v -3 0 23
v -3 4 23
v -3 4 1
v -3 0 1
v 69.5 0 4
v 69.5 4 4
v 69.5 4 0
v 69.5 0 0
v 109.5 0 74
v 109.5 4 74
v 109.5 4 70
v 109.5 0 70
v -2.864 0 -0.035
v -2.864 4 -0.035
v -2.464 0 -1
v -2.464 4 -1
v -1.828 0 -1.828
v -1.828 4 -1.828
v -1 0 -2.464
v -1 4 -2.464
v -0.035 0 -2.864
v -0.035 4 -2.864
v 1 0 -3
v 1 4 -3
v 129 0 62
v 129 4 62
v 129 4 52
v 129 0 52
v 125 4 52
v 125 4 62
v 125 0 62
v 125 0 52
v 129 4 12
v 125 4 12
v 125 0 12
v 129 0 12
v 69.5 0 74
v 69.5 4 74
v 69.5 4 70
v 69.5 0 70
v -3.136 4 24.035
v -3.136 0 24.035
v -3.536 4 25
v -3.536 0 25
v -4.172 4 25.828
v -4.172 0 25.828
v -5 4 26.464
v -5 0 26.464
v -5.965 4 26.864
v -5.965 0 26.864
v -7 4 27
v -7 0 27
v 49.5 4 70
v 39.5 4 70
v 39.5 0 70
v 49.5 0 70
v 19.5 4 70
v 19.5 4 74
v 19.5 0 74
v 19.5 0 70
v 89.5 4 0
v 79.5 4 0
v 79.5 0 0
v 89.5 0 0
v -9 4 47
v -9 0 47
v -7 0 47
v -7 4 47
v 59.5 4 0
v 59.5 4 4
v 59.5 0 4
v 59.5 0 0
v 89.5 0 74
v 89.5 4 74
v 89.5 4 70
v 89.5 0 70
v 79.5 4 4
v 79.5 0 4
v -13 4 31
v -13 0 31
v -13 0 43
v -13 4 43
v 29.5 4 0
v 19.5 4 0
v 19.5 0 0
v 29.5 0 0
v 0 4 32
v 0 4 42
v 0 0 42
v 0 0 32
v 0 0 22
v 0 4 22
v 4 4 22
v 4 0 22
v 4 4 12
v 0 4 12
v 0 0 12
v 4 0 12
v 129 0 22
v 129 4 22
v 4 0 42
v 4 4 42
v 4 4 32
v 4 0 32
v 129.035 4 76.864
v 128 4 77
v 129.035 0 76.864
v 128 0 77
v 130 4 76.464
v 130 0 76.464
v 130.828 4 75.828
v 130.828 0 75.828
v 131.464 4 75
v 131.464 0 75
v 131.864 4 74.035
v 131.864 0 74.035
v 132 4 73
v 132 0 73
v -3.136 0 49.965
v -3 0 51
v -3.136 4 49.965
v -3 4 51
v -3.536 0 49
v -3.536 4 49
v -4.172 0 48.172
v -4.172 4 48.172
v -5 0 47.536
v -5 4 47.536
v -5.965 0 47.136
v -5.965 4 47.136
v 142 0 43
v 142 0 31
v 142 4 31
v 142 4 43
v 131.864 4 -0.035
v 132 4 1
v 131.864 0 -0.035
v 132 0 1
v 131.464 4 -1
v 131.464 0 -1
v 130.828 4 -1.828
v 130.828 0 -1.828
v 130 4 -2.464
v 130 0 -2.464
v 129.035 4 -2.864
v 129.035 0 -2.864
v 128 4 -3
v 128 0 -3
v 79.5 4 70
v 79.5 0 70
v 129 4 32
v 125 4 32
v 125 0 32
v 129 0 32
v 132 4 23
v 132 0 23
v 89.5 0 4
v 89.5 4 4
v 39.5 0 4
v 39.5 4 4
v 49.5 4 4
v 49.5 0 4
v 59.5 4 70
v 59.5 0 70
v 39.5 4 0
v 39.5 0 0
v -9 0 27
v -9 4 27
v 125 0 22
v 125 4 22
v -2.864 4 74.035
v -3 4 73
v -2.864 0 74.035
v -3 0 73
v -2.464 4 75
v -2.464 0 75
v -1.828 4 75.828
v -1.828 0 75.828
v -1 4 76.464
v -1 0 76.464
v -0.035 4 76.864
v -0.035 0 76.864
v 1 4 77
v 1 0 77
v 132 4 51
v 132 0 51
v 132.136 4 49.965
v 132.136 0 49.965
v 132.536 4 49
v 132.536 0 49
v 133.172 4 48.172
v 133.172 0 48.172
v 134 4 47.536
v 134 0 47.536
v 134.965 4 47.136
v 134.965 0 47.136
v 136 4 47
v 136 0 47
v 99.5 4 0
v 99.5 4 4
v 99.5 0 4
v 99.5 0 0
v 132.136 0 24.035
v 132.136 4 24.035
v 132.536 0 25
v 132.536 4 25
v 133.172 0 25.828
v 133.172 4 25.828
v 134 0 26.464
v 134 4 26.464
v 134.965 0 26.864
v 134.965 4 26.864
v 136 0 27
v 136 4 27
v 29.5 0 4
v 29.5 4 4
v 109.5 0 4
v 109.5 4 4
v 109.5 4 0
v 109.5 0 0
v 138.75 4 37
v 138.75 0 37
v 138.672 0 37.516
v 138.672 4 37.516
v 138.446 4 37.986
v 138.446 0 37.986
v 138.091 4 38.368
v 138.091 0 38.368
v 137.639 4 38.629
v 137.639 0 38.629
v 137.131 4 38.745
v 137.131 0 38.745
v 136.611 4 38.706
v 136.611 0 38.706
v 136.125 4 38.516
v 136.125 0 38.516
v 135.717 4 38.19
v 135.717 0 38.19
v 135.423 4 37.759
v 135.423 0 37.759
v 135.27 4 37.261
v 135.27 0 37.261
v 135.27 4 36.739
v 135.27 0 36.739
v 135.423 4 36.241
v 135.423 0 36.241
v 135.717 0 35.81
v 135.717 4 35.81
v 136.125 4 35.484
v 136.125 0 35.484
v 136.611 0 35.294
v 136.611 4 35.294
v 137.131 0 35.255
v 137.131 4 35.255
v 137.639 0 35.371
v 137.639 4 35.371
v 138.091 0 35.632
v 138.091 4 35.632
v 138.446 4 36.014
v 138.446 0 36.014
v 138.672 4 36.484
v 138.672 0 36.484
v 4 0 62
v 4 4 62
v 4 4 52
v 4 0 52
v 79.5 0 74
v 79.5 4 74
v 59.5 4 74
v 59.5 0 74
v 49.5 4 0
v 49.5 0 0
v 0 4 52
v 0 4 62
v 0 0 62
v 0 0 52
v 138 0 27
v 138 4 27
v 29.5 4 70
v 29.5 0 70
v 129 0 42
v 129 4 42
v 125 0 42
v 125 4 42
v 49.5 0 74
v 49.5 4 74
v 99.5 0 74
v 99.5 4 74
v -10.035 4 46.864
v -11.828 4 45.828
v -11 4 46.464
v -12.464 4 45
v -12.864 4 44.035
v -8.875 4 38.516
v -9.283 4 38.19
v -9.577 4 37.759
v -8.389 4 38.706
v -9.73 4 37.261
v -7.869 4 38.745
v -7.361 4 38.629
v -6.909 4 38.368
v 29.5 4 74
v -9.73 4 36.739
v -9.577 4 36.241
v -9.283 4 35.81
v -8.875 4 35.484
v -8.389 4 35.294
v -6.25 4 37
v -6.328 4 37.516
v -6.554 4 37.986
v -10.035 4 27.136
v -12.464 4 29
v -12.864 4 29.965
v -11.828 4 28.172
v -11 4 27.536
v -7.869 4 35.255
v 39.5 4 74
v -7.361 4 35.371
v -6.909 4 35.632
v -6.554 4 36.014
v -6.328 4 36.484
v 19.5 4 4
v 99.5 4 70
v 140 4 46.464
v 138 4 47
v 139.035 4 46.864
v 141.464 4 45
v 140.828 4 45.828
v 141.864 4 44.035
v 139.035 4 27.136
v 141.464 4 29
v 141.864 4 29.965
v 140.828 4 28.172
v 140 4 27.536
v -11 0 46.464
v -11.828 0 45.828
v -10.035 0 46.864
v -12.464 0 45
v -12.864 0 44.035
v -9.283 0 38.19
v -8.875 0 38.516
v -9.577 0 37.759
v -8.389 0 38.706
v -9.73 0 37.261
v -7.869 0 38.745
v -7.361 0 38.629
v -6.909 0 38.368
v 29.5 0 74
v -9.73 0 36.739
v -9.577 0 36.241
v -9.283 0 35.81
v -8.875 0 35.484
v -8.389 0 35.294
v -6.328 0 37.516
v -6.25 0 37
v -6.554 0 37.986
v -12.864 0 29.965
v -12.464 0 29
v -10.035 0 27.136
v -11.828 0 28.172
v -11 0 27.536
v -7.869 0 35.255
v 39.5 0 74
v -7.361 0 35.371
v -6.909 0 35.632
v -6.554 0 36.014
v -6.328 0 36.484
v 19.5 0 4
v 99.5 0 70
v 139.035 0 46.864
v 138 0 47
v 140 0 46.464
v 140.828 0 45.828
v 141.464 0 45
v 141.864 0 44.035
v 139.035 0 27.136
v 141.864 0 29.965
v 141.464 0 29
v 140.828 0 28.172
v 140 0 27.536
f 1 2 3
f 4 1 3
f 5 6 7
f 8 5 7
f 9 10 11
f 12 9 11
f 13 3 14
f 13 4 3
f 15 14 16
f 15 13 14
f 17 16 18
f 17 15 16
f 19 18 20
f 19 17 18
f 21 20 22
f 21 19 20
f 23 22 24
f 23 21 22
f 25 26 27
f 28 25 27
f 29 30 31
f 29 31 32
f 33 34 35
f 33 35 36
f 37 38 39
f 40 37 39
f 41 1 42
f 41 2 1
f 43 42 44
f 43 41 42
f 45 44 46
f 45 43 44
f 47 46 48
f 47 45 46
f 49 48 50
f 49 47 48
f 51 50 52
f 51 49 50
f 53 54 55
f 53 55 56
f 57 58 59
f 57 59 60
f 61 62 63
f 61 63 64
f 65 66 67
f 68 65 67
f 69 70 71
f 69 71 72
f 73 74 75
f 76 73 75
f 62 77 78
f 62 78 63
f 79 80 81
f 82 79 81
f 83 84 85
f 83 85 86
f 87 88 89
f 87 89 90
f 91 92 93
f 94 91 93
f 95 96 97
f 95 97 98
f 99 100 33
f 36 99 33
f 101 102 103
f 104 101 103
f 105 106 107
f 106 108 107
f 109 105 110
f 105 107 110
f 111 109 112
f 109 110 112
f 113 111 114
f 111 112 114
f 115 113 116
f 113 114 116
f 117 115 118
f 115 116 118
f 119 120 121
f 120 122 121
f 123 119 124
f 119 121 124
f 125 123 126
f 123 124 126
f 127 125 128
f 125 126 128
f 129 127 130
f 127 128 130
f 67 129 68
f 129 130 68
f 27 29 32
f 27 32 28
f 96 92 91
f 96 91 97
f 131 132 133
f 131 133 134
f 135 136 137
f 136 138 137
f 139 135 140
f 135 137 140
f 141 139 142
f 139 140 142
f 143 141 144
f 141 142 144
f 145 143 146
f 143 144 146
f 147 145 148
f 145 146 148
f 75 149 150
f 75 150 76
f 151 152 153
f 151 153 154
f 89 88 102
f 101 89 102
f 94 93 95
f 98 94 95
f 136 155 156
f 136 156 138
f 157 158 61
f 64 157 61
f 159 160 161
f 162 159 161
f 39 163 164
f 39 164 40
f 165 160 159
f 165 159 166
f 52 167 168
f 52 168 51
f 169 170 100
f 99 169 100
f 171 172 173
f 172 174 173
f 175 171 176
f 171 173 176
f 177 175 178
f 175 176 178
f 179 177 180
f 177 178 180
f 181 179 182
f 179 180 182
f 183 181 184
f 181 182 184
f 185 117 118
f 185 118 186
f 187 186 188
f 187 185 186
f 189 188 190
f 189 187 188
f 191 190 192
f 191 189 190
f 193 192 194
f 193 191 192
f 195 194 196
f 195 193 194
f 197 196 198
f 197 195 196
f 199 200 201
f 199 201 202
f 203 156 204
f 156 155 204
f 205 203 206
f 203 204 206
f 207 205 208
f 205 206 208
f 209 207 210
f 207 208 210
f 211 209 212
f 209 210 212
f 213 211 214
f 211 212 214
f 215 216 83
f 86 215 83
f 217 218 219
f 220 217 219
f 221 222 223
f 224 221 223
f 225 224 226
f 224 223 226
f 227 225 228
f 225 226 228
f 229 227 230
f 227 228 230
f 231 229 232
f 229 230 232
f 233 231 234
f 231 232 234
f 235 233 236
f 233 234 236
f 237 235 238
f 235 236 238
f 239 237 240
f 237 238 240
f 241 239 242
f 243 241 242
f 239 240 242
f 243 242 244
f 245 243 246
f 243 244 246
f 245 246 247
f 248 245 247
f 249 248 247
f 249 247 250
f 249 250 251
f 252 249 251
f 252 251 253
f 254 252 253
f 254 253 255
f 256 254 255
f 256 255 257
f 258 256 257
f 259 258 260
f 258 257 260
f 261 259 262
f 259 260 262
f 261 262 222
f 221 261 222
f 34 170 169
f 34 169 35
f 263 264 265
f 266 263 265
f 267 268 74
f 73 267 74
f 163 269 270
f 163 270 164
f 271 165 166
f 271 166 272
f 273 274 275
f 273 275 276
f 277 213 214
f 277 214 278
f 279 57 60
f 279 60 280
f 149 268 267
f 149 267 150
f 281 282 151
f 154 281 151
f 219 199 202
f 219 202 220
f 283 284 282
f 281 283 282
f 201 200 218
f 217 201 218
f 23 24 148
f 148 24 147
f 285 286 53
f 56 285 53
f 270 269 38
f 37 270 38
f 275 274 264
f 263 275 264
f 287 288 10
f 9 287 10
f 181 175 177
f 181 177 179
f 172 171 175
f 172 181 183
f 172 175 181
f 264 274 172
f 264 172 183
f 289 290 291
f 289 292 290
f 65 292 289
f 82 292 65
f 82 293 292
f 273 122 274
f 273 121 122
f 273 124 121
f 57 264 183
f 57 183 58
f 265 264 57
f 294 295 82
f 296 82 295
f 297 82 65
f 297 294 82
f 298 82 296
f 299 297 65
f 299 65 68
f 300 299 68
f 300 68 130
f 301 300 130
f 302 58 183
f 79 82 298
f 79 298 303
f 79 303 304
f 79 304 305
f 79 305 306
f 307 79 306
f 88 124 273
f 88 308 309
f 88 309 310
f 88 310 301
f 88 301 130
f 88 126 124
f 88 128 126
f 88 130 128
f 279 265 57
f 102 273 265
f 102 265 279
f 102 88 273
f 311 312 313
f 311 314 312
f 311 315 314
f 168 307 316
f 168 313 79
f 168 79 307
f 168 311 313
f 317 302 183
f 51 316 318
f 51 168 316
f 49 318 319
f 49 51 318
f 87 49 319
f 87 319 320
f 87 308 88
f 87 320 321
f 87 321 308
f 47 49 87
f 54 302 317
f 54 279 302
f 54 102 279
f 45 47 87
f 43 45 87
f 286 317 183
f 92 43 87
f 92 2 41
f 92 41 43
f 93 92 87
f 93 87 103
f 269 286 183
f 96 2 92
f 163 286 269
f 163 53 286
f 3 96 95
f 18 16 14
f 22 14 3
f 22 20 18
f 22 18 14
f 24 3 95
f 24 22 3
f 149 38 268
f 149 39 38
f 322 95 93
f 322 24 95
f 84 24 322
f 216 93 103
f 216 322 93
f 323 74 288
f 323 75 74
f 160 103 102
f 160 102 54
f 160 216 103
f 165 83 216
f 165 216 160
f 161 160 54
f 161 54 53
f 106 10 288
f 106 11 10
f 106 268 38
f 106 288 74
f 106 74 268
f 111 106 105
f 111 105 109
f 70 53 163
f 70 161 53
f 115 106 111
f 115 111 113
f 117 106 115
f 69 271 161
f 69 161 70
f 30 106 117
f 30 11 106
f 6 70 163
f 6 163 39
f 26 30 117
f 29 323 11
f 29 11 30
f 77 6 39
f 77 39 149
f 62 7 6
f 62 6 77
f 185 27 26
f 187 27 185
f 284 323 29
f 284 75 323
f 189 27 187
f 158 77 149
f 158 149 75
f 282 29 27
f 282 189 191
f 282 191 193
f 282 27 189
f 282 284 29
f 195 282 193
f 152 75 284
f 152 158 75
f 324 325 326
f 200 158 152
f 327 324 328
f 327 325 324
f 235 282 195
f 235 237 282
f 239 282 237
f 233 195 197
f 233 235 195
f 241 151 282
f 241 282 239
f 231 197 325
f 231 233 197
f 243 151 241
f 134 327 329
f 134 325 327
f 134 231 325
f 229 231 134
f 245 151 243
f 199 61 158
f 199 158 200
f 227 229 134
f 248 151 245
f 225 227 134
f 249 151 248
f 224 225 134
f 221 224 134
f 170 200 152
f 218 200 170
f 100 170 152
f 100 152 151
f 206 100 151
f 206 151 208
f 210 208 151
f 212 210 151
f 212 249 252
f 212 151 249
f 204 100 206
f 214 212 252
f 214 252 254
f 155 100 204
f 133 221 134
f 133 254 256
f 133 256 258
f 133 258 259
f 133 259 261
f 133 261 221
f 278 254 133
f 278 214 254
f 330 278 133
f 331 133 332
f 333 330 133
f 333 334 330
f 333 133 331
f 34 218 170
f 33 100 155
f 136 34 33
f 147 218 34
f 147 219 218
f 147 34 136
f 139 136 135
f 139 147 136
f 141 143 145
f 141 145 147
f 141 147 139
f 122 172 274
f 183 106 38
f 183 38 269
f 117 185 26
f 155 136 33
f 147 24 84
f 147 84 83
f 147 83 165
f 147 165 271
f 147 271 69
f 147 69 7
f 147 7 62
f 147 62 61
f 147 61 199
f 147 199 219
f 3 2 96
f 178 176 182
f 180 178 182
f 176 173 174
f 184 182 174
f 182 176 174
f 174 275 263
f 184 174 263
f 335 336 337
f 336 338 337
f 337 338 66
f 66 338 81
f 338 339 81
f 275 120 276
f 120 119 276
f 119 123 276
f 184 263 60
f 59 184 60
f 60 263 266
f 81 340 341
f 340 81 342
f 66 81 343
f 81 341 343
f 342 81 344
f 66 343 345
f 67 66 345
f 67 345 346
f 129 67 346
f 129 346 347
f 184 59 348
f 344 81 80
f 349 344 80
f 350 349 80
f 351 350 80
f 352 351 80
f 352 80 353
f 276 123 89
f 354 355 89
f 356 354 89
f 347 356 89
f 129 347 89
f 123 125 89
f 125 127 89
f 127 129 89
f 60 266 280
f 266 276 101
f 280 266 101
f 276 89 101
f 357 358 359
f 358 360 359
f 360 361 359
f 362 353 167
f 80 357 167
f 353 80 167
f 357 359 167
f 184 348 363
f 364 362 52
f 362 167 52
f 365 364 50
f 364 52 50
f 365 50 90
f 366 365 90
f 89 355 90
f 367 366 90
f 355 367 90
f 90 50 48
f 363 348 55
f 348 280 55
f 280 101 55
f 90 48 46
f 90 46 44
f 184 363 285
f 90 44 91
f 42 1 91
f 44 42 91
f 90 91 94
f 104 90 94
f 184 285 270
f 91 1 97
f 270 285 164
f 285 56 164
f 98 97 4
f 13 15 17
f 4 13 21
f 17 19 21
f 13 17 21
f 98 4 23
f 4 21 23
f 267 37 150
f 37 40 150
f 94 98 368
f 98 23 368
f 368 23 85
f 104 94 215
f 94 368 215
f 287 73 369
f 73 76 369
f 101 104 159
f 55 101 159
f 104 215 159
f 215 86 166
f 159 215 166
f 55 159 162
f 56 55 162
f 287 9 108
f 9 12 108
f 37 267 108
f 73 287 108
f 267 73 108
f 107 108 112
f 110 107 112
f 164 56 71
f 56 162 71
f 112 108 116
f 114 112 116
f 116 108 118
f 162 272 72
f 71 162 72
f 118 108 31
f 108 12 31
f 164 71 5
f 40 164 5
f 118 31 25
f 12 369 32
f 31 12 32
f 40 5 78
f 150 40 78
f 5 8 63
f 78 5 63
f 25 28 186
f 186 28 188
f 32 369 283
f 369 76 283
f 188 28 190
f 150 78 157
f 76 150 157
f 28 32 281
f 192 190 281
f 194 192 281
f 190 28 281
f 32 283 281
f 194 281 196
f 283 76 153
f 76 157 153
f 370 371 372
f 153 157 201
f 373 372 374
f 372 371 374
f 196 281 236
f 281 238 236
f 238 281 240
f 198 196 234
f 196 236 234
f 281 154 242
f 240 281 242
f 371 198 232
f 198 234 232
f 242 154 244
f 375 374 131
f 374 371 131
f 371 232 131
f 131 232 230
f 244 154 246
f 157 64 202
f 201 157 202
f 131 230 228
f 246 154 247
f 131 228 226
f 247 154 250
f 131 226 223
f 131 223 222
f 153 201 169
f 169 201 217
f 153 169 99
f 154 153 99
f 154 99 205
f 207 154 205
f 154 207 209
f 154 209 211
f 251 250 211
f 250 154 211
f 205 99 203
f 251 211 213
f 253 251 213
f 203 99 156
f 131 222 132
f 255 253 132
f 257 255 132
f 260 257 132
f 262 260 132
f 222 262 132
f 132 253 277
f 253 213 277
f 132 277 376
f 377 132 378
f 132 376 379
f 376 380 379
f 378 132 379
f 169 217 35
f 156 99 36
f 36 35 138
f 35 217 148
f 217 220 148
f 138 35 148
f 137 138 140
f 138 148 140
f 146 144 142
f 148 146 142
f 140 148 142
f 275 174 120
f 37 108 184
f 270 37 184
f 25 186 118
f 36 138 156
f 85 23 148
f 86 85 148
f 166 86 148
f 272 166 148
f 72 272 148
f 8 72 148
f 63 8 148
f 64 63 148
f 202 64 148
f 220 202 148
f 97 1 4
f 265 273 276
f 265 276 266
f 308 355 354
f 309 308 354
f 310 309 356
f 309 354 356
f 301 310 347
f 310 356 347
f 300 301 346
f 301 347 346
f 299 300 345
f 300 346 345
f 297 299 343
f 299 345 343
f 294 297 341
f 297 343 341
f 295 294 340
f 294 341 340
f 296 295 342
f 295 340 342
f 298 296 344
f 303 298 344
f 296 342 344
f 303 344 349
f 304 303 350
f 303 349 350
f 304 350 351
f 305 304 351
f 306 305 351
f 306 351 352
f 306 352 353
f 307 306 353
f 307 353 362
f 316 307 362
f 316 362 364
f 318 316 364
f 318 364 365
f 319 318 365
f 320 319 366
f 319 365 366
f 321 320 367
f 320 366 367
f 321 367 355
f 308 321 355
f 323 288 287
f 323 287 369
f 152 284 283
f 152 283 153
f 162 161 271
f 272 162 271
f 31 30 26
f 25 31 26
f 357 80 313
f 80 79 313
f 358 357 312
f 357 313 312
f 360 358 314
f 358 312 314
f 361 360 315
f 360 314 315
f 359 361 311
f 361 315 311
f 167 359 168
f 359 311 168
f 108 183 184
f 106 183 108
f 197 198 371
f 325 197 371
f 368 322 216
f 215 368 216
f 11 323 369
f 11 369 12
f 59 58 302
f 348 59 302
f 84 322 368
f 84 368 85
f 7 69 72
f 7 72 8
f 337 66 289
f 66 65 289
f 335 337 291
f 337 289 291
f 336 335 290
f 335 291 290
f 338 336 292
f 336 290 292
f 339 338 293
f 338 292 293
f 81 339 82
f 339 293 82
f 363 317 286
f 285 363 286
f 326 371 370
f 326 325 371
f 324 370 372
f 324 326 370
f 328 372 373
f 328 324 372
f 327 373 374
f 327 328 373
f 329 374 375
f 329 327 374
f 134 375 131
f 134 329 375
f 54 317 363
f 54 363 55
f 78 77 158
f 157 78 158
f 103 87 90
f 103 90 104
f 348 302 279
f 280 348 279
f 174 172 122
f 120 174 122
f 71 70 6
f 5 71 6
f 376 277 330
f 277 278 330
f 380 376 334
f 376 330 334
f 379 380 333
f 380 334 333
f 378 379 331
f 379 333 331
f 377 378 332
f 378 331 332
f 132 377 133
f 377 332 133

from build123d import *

# Parameters (mm, degrees)
SKETCH1_W           = 129
SKETCH1_H           = 74
BOSS_EXTRUDE1_DEPTH = 4
SKETCH4_W           = 4
SKETCH4_H           = 10
SKETCH4_W_2         = 10
SKETCH4_H_2         = 4
CUT_EXTRUDE3_DEPTH  = 5
SKETCH5_W           = 135
SKETCH5_H           = 80
SKETCH5_W_2         = 129
SKETCH5_H_2         = 74
BOSS_EXTRUDE2_DEPTH = 4
SKETCH6_W           = 10
SKETCH6_H           = 20
SKETCH6_R           = 1.75
BOSS_EXTRUDE3_DEPTH = 4
FILLET1_R           = 4


with BuildPart() as part:
    # Sketch1 → Boss-Extrude1 (new body)
    with BuildSketch(Plane(origin=(0, 0, 0), x_dir=(1, 0, 0), z_dir=(0, 1, 0))):
        with Locations((64.5, -37)):
            Rectangle(SKETCH1_W, SKETCH1_H)
    extrude(amount=BOSS_EXTRUDE1_DEPTH)

    # Sketch4 → Cut-Extrude3 (cut, through all)
    with BuildSketch(Plane(origin=(0, 4, 0), x_dir=(1, 0, 0), z_dir=(0, 1, 0))):
        with Locations((127, -57)):
            Rectangle(SKETCH4_W, SKETCH4_H)
        with Locations((127, -37)):
            Rectangle(SKETCH4_W, SKETCH4_H)
        with Locations((127, -17)):
            Rectangle(SKETCH4_W, SKETCH4_H)
        with Locations((2, -57)):
            Rectangle(SKETCH4_W, SKETCH4_H)
        with Locations((2, -37)):
            Rectangle(SKETCH4_W, SKETCH4_H)
        with Locations((2, -17)):
            Rectangle(SKETCH4_W, SKETCH4_H)
        with Locations((104.5, -2)):
            Rectangle(SKETCH4_W_2, SKETCH4_H_2)
        with Locations((84.5, -2)):
            Rectangle(SKETCH4_W_2, SKETCH4_H_2)
        with Locations((64.5, -2)):
            Rectangle(SKETCH4_W_2, SKETCH4_H_2)
        with Locations((44.5, -2)):
            Rectangle(SKETCH4_W_2, SKETCH4_H_2)
        with Locations((24.5, -2)):
            Rectangle(SKETCH4_W_2, SKETCH4_H_2)
        with Locations((104.5, -72)):
            Rectangle(SKETCH4_W_2, SKETCH4_H_2)
        with Locations((84.5, -72)):
            Rectangle(SKETCH4_W_2, SKETCH4_H_2)
        with Locations((64.5, -72)):
            Rectangle(SKETCH4_W_2, SKETCH4_H_2)
        with Locations((44.5, -72)):
            Rectangle(SKETCH4_W_2, SKETCH4_H_2)
        with Locations((24.5, -72)):
            Rectangle(SKETCH4_W_2, SKETCH4_H_2)
    extrude(amount=-CUT_EXTRUDE3_DEPTH, mode=Mode.SUBTRACT)

    # Sketch5 → Boss-Extrude2 (add, through all)
    with BuildSketch(Plane(origin=(0, 4, 0), x_dir=(1, 0, 0), z_dir=(0, 1, 0))):
        with Locations((64.5, -37)):
            Rectangle(SKETCH5_W, SKETCH5_H)
        with Locations((64.5, -37)):
            Rectangle(SKETCH5_W_2, SKETCH5_H_2, mode=Mode.SUBTRACT)
    extrude(amount=-BOSS_EXTRUDE2_DEPTH)

    # Sketch6 → Boss-Extrude3 (add, through all)
    with BuildSketch(Plane.XZ):
        with Locations((137, 37)):
            Rectangle(SKETCH6_W, SKETCH6_H)
        with Locations((137, 37)):
            Circle(SKETCH6_R, mode=Mode.SUBTRACT)
        with Locations((-8, 37)):
            Rectangle(SKETCH6_W, SKETCH6_H)
        with Locations((-8, 37)):
            Circle(SKETCH6_R, mode=Mode.SUBTRACT)
    extrude(amount=-BOSS_EXTRUDE3_DEPTH)

    # Fillet1
    fillet1_edges = [part.edges().sort_by_distance(p)[0] for p in [
        (132, 2, -3),
        (132, 2, 77),
        (-3, 2, 77),
        (-3, 2, -3),
        (132, 2, 27),
        (132, 2, 47),
        (142, 2, 47),
        (142, 2, 27),
        (-13, 2, 27),
        (-13, 2, 47),
        (-3, 2, 47),
        (-3, 2, 27),
    ]]
    fillet(fillet1_edges, radius=FILLET1_R)


solid = part.part
